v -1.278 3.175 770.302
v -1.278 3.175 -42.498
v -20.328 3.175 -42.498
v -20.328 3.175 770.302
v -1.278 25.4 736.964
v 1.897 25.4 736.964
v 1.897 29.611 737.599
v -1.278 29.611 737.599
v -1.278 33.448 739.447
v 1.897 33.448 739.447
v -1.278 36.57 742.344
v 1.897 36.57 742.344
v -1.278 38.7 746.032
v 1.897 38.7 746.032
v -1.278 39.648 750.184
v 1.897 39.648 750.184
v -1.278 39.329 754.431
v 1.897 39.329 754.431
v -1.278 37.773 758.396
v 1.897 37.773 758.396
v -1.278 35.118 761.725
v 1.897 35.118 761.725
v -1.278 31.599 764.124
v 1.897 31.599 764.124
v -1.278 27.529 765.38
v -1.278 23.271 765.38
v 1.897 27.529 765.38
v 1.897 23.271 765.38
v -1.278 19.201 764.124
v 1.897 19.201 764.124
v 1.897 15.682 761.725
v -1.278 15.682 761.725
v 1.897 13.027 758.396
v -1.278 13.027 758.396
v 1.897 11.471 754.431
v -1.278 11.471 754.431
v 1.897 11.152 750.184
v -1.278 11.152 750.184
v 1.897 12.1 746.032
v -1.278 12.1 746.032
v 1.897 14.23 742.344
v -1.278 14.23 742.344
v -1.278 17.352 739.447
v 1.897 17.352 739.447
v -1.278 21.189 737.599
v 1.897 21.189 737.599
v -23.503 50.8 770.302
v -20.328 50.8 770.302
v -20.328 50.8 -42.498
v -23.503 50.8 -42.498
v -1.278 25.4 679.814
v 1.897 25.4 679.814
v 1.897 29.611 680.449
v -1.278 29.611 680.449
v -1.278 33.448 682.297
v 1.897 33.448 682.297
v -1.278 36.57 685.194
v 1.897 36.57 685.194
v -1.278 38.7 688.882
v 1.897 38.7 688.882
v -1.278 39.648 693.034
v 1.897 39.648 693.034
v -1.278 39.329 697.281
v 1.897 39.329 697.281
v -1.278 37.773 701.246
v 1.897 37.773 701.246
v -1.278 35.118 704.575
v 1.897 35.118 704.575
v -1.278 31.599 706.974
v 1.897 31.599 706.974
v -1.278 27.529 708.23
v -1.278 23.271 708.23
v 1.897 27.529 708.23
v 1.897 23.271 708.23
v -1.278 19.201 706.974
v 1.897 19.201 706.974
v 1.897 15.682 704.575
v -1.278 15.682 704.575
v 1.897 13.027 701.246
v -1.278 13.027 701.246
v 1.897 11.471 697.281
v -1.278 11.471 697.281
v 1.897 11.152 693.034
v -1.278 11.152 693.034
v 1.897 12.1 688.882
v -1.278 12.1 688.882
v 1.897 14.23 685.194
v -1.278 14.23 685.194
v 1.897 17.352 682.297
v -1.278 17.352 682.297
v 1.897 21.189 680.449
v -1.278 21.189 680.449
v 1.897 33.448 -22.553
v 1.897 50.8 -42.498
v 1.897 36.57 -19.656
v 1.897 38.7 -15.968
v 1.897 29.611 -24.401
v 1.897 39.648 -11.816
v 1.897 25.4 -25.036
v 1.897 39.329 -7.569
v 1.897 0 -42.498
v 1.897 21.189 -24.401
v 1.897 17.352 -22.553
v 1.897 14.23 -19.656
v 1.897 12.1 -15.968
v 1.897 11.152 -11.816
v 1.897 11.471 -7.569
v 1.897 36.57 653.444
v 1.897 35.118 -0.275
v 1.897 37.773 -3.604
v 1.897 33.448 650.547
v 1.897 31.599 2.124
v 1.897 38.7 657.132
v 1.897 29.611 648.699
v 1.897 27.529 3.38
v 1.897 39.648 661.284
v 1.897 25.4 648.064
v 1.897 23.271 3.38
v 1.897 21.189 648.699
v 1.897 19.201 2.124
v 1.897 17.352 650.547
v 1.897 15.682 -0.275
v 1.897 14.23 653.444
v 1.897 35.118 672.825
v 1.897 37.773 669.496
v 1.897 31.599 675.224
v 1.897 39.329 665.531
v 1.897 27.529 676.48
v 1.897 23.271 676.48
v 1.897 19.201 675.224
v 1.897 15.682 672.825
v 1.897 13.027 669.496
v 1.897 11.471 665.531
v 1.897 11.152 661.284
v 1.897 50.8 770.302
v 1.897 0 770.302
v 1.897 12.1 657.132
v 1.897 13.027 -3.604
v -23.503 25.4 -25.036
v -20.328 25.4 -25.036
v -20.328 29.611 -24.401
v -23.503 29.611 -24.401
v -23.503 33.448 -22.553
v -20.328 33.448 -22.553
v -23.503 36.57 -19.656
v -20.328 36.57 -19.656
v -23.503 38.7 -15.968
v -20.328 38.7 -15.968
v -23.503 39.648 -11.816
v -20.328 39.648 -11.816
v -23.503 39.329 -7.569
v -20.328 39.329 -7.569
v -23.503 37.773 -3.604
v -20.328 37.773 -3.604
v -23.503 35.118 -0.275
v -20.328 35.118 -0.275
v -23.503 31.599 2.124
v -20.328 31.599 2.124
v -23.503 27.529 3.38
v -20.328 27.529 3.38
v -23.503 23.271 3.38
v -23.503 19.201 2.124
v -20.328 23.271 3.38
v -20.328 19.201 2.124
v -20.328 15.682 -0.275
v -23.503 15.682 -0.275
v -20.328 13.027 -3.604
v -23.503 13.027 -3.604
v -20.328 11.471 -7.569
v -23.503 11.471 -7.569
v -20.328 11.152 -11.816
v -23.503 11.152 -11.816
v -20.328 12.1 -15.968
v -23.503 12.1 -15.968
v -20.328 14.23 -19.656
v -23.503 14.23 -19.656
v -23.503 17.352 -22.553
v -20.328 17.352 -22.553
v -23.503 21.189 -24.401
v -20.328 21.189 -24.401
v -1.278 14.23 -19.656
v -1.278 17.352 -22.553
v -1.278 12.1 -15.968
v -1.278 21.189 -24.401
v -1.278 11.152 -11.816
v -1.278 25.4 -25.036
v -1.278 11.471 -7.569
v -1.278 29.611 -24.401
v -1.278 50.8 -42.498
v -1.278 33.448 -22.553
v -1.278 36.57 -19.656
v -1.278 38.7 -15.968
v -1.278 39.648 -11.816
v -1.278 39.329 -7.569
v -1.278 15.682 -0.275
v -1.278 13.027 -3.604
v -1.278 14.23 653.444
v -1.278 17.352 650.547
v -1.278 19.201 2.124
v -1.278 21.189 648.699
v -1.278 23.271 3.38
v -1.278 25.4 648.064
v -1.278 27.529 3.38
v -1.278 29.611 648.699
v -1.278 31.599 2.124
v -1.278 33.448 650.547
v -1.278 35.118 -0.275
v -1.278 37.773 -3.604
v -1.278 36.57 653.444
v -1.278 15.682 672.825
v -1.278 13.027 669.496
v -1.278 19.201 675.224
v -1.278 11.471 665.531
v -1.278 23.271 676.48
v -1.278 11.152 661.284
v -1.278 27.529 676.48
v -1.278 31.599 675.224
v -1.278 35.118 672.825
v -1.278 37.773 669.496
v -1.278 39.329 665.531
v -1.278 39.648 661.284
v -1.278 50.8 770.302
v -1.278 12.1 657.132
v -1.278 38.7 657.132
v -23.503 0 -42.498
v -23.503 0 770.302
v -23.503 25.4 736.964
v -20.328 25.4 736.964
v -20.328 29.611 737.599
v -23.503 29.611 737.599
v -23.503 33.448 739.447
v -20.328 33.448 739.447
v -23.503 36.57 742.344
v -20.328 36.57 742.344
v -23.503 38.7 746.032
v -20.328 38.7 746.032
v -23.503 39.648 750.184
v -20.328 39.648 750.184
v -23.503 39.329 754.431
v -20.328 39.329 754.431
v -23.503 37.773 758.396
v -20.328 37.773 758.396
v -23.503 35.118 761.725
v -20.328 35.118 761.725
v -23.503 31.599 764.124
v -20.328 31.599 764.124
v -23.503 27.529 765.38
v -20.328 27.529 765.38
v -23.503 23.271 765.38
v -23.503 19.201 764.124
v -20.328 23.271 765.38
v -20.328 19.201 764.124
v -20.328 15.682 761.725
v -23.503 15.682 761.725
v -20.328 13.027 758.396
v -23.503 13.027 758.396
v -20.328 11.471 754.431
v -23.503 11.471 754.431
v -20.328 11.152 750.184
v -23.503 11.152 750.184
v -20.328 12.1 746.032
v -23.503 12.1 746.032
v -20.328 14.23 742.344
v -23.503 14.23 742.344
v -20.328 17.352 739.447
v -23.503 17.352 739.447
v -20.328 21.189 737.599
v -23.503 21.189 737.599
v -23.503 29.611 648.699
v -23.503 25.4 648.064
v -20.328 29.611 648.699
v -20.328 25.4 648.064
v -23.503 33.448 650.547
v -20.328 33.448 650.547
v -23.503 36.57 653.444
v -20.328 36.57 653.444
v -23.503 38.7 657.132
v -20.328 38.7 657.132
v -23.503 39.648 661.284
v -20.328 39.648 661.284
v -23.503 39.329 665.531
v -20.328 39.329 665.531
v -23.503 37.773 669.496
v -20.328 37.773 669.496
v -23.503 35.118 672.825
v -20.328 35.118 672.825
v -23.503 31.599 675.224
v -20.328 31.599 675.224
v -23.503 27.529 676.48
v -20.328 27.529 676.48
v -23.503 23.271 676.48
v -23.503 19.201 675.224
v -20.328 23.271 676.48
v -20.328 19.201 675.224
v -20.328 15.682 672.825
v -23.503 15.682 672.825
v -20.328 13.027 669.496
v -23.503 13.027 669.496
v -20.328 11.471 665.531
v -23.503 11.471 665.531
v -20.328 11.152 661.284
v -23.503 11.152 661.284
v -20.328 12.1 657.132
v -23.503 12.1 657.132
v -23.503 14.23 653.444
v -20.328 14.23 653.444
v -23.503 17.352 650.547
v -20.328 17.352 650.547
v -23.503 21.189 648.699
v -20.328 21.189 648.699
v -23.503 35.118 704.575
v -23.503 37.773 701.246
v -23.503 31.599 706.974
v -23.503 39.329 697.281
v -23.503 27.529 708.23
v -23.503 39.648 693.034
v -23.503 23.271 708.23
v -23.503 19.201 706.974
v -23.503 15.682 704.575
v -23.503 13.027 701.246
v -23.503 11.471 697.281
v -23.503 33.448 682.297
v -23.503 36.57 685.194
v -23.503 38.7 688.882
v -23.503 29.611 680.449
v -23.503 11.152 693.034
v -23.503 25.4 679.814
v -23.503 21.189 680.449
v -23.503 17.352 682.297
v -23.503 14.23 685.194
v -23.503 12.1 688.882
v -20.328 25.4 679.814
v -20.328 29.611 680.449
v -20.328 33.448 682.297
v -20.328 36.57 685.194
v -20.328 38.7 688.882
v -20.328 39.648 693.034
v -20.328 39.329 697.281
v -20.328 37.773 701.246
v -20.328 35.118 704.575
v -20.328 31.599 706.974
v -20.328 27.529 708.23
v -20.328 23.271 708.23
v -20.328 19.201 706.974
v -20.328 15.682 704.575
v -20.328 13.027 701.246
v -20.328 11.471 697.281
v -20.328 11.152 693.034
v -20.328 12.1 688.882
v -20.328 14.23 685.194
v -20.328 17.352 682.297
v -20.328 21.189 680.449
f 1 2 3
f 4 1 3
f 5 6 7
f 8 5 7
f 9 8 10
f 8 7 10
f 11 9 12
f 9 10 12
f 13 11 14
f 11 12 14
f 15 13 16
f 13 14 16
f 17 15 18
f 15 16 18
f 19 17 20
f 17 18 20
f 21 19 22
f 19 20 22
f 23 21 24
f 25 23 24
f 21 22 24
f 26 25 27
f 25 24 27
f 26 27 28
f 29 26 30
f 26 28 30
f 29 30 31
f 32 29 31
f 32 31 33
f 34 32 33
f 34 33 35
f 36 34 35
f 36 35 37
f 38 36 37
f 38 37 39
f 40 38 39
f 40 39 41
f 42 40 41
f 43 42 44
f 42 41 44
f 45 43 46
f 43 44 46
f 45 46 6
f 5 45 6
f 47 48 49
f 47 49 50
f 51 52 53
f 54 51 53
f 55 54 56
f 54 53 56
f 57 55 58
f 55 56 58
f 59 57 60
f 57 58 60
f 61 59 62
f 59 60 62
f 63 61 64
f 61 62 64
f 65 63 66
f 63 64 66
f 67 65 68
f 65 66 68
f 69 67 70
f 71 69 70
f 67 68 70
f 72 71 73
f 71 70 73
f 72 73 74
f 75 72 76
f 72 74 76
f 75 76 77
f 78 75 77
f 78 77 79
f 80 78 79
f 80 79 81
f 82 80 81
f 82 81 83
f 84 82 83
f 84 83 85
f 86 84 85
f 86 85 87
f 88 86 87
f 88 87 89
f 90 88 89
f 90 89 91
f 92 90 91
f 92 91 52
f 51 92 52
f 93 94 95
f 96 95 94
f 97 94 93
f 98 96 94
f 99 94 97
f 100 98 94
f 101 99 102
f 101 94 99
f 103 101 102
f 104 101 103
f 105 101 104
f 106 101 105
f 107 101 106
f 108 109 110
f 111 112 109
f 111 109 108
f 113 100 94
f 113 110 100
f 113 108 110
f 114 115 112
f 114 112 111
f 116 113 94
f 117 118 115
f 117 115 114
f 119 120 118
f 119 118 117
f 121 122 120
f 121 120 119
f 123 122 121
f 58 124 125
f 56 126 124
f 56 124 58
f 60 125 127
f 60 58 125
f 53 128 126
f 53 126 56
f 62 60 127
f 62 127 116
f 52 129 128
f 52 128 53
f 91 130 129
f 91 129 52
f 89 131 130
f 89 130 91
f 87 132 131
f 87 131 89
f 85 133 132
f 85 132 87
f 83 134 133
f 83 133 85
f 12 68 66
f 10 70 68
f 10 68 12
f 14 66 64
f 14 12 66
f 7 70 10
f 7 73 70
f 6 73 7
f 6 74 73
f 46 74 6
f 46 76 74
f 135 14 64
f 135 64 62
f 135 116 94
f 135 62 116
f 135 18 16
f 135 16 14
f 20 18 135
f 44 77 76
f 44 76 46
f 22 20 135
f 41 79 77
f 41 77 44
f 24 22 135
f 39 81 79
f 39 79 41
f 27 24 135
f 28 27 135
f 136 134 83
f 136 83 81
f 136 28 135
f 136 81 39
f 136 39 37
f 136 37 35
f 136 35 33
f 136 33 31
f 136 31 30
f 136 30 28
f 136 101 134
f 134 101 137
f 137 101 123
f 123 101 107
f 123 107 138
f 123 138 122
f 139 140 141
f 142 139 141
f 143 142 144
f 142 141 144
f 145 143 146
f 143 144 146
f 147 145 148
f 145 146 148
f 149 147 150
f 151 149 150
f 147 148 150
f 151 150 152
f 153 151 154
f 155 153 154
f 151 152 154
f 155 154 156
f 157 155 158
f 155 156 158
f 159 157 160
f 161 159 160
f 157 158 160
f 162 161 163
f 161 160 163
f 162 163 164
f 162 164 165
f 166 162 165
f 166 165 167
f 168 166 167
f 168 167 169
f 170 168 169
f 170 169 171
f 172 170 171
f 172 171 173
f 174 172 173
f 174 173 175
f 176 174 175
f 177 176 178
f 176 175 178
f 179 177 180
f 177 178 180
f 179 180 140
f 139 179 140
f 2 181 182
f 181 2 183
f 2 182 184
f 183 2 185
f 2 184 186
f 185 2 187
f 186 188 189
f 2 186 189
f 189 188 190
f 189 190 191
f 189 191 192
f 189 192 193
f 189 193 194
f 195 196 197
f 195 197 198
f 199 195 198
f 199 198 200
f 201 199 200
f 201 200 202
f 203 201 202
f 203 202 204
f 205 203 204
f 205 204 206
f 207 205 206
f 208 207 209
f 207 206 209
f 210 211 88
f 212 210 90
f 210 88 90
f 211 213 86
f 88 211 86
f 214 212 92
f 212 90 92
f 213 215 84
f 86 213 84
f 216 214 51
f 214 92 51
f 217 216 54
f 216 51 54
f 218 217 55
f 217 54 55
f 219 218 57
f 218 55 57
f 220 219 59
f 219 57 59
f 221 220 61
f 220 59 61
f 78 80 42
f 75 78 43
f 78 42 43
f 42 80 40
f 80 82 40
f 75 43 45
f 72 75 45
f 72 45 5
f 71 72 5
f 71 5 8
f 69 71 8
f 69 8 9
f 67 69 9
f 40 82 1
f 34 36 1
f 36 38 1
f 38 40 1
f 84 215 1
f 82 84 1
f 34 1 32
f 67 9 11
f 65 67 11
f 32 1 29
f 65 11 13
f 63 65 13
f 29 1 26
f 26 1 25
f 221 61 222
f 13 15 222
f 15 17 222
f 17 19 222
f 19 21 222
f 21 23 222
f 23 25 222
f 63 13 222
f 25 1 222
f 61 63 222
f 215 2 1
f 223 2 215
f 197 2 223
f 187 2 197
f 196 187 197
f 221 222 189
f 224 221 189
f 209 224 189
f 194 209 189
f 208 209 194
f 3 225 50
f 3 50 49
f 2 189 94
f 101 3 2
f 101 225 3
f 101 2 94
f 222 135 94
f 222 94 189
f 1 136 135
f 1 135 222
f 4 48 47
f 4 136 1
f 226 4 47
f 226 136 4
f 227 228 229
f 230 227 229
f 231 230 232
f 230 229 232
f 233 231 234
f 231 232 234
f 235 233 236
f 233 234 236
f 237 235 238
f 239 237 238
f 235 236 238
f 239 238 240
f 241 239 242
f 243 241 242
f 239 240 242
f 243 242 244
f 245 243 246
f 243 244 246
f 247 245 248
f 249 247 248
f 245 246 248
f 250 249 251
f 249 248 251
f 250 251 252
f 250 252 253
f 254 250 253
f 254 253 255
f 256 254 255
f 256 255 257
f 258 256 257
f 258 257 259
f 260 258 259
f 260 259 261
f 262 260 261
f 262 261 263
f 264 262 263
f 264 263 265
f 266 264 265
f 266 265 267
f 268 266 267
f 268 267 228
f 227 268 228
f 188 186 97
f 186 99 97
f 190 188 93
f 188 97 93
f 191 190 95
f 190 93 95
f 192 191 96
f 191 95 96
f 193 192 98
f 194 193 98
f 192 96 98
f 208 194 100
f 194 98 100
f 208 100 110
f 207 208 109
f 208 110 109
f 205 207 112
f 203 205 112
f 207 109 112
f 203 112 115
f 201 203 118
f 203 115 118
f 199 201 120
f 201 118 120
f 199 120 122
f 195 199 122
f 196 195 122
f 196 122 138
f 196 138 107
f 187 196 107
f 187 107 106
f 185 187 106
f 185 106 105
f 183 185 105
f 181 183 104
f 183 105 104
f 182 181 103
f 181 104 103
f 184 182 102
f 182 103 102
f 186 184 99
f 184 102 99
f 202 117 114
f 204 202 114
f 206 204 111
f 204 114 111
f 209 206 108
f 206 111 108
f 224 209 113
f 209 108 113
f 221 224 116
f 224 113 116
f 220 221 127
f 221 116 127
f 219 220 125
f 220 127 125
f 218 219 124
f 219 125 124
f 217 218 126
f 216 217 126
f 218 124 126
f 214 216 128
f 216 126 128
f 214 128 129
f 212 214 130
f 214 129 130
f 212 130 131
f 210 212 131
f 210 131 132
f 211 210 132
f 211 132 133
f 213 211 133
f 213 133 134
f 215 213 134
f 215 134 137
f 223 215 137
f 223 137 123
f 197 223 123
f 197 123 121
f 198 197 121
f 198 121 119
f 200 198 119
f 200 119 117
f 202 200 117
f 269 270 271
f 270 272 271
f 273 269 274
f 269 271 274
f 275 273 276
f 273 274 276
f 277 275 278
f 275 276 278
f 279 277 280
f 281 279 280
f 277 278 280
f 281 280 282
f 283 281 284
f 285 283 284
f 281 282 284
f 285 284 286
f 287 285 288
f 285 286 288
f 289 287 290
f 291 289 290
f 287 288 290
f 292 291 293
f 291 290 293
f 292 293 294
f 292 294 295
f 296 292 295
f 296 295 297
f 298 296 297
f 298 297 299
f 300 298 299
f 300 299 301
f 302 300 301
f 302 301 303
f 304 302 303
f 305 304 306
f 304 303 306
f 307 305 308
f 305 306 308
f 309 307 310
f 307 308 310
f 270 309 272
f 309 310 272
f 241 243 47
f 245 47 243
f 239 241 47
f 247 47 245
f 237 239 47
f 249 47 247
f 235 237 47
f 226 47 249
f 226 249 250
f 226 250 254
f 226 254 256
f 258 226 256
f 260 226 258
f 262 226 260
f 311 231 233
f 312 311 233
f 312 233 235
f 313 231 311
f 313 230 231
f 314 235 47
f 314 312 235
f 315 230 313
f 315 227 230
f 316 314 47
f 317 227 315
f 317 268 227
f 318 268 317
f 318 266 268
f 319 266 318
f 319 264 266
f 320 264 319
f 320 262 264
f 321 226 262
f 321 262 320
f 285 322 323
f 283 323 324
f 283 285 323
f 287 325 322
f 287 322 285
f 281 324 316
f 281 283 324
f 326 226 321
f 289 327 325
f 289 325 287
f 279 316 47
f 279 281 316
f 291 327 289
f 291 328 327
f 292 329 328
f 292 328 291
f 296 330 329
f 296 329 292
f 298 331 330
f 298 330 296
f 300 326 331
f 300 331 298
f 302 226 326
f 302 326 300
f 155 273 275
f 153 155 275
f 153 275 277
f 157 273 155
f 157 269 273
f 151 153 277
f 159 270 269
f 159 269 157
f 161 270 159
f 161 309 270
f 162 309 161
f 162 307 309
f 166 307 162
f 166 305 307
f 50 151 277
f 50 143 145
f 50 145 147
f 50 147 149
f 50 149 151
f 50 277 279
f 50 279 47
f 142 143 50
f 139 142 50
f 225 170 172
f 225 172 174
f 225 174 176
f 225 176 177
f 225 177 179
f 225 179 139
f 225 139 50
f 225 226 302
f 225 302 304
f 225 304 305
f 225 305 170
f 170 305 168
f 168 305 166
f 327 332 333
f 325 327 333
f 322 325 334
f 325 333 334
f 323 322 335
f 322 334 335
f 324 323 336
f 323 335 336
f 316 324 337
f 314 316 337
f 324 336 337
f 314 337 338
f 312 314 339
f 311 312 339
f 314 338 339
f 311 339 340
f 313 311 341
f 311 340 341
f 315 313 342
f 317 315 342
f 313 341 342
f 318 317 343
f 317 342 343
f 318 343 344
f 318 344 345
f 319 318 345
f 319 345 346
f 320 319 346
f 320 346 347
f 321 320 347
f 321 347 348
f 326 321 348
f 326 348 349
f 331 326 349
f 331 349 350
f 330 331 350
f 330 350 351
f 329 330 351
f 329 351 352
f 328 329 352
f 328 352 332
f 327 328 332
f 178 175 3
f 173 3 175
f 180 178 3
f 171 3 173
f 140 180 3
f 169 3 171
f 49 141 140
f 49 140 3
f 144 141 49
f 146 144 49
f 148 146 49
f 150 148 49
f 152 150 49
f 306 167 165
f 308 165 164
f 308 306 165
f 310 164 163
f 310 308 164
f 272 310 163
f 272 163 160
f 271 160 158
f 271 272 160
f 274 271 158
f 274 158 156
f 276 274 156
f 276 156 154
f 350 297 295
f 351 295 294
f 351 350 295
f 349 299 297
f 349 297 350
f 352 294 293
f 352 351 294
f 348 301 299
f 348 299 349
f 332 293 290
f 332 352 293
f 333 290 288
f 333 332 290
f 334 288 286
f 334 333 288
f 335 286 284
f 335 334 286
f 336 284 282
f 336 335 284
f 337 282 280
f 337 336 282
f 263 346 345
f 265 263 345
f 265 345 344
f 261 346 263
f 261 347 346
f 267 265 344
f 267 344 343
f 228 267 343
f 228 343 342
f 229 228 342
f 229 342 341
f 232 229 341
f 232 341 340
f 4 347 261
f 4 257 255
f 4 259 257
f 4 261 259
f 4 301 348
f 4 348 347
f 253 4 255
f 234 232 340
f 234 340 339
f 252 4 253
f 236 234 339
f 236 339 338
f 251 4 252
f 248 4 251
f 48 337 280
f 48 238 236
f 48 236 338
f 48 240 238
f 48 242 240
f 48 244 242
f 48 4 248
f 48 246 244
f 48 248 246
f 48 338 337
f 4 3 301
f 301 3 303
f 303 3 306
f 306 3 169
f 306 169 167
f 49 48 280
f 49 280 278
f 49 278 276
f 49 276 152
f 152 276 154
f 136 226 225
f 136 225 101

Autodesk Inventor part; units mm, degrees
ref_plane "YZ Plane" through (0, 0, 0) normal (1, 0, 0) x (0, 1, 0)
ref_plane "XZ Plane" through (0, 0, 0) normal (0, 1, 0) x (-1, 0, 0)
ref_plane "XY Plane" through (0, 0, 0) normal (0, 0, 1) x (1, 0, 0)
sketch "Sketch1" plane through (0, 0, 0) normal (0, 1, 0) x (-1, 0, 0)
  line L0 (23.5034, -42.4981) -> (-1.8966, -42.4981)
  line L1 (-1.8966, -42.4981) -> (-1.8966, 770.3019)
  line L2 (-1.8966, 770.3019) -> (23.5034, 770.3019)
  line L3 (23.5034, 770.3019) -> (23.5034, -42.4981)
  line L4 (20.3284, -39.3231) -> (1.2784, -39.3231)
  line L5 (1.2784, -39.3231) -> (1.2784, 767.1269)
  line L6 (1.2784, 767.1269) -> (20.3284, 767.1269)
  line L7 (20.3284, 767.1269) -> (20.3284, -39.3231)
  point P0 (0, 0)
  dimension "d0" = 25.4
  dimension "d1" = 812.8
  dimension "d2" = 3.175
ref_plane "Work Plane3" through (0, 0, 0) normal (0, -1, 0) x (1, 0, 0)
sketch "Sketch2" plane through (0, 0, 0) normal (0, -1, 0) x (1, 0, 0)
  line L0 (-1.2784, -39.3231) -> (-20.3284, -39.3231) projected
  line L1 (-20.3284, -39.3231) -> (-20.3284, 767.1269) projected
  line L2 (-1.2784, -39.3231) -> (-20.3284, -39.3231)
  line L3 (-20.3284, -39.3231) -> (-20.3284, 767.1269)
  line L4 (-20.3284, 767.1269) -> (-1.2784, 767.1269)
  line L5 (-1.2784, 767.1269) -> (-1.2784, -39.3231)
  point P0 (0, 0)
extrude "Extrusion3" add sketch "Sketch2" against normal blind 3.175
extrude "Extrusion5" add sketch "Sketch1" along normal blind 50.8
sketch "Sketch4" plane through (-23.5034, 0, 770.3019) normal (0, 0, 1) x (1, 0, 0)
  line L0 (0, 50.8) -> (25.4, 50.8) projected
  line L1 (0, 50.8) -> (3.175, 50.8)
  line L2 (3.175, 50.8) -> (25.4, 50.8)
  line L3 (25.4, 50.8) -> (22.225, 50.8)
  line L4 (22.225, 3.175) -> (22.225, 50.8) projected
  line L5 (3.175, 50.8) -> (22.225, 50.8)
  line L6 (22.225, 50.8) -> (22.225, 3.175)
  line L7 (22.225, 3.175) -> (3.175, 3.175)
  line L8 (3.175, 3.175) -> (3.175, 50.8)
  point P0 (23.5034, 0)
  point P1 (22.225, 0)
  dimension "d13" = 3.175
  dimension "d14" = 3.175
extrude "Extrusion6" cut sketch "Sketch4" against normal blind 1016
sketch "Sketch5" plane through (1.8966, 0, 770.3019) normal (1, 0, 0) x (0, 0, -1)
  line L0 (0, 0) -> (19.05, 0)
  line L1 (19.05, 0) -> (19.05, 25.4)
  line L2 (19.05, 25.4) -> (0, 25.4)
  line L3 (0, 25.4) -> (0, 0)
  circle A0 centre (19.05, 25.4) radius 14.2875
  line L4 (19.05, 25.4) -> (76.2, 25.4)
  circle A1 centre (76.2, 25.4) radius 14.2875
  line L5 (76.2, 25.4) -> (107.95, 25.4)
  circle A2 centre (107.95, 25.4) radius 14.2875
  point P0 (770.3019, 0)
  dimension "d17" = 19.05
  dimension "d18" = 25.4
  dimension "d19" = 28.575
  dimension "d22" = 57.15
  dimension "d23" = 28.575
  dimension "d26" = 31.75
  dimension "d27" = 28.575
extrude "Extrusion10" cut sketch "Sketch5" against normal blind 50.8 contours A2 | A1 L5 L4 | L4 L5 A1 | A0 L2 L1 | L1 L4 A0 | A0 L4 L2
sketch "Sketch6" plane through (1.8966, 0, 770.3019) normal (1, 0, 0) x (0, 0, -1)
  line L0 (812.8, 0) -> (812.8, 50.8) projected
  line L1 (812.8, 25.4) -> (781.05, 25.4)
  circle A0 centre (781.05, 25.4) radius 14.2875
  point P0 (770.3019, 0)
  dimension "d32" = 31.75
  dimension "d33" = 28.575
extrude "Extrusion11" cut sketch "Sketch6" against normal blind 76.2
properties part number "36in Aluminum Channel"
